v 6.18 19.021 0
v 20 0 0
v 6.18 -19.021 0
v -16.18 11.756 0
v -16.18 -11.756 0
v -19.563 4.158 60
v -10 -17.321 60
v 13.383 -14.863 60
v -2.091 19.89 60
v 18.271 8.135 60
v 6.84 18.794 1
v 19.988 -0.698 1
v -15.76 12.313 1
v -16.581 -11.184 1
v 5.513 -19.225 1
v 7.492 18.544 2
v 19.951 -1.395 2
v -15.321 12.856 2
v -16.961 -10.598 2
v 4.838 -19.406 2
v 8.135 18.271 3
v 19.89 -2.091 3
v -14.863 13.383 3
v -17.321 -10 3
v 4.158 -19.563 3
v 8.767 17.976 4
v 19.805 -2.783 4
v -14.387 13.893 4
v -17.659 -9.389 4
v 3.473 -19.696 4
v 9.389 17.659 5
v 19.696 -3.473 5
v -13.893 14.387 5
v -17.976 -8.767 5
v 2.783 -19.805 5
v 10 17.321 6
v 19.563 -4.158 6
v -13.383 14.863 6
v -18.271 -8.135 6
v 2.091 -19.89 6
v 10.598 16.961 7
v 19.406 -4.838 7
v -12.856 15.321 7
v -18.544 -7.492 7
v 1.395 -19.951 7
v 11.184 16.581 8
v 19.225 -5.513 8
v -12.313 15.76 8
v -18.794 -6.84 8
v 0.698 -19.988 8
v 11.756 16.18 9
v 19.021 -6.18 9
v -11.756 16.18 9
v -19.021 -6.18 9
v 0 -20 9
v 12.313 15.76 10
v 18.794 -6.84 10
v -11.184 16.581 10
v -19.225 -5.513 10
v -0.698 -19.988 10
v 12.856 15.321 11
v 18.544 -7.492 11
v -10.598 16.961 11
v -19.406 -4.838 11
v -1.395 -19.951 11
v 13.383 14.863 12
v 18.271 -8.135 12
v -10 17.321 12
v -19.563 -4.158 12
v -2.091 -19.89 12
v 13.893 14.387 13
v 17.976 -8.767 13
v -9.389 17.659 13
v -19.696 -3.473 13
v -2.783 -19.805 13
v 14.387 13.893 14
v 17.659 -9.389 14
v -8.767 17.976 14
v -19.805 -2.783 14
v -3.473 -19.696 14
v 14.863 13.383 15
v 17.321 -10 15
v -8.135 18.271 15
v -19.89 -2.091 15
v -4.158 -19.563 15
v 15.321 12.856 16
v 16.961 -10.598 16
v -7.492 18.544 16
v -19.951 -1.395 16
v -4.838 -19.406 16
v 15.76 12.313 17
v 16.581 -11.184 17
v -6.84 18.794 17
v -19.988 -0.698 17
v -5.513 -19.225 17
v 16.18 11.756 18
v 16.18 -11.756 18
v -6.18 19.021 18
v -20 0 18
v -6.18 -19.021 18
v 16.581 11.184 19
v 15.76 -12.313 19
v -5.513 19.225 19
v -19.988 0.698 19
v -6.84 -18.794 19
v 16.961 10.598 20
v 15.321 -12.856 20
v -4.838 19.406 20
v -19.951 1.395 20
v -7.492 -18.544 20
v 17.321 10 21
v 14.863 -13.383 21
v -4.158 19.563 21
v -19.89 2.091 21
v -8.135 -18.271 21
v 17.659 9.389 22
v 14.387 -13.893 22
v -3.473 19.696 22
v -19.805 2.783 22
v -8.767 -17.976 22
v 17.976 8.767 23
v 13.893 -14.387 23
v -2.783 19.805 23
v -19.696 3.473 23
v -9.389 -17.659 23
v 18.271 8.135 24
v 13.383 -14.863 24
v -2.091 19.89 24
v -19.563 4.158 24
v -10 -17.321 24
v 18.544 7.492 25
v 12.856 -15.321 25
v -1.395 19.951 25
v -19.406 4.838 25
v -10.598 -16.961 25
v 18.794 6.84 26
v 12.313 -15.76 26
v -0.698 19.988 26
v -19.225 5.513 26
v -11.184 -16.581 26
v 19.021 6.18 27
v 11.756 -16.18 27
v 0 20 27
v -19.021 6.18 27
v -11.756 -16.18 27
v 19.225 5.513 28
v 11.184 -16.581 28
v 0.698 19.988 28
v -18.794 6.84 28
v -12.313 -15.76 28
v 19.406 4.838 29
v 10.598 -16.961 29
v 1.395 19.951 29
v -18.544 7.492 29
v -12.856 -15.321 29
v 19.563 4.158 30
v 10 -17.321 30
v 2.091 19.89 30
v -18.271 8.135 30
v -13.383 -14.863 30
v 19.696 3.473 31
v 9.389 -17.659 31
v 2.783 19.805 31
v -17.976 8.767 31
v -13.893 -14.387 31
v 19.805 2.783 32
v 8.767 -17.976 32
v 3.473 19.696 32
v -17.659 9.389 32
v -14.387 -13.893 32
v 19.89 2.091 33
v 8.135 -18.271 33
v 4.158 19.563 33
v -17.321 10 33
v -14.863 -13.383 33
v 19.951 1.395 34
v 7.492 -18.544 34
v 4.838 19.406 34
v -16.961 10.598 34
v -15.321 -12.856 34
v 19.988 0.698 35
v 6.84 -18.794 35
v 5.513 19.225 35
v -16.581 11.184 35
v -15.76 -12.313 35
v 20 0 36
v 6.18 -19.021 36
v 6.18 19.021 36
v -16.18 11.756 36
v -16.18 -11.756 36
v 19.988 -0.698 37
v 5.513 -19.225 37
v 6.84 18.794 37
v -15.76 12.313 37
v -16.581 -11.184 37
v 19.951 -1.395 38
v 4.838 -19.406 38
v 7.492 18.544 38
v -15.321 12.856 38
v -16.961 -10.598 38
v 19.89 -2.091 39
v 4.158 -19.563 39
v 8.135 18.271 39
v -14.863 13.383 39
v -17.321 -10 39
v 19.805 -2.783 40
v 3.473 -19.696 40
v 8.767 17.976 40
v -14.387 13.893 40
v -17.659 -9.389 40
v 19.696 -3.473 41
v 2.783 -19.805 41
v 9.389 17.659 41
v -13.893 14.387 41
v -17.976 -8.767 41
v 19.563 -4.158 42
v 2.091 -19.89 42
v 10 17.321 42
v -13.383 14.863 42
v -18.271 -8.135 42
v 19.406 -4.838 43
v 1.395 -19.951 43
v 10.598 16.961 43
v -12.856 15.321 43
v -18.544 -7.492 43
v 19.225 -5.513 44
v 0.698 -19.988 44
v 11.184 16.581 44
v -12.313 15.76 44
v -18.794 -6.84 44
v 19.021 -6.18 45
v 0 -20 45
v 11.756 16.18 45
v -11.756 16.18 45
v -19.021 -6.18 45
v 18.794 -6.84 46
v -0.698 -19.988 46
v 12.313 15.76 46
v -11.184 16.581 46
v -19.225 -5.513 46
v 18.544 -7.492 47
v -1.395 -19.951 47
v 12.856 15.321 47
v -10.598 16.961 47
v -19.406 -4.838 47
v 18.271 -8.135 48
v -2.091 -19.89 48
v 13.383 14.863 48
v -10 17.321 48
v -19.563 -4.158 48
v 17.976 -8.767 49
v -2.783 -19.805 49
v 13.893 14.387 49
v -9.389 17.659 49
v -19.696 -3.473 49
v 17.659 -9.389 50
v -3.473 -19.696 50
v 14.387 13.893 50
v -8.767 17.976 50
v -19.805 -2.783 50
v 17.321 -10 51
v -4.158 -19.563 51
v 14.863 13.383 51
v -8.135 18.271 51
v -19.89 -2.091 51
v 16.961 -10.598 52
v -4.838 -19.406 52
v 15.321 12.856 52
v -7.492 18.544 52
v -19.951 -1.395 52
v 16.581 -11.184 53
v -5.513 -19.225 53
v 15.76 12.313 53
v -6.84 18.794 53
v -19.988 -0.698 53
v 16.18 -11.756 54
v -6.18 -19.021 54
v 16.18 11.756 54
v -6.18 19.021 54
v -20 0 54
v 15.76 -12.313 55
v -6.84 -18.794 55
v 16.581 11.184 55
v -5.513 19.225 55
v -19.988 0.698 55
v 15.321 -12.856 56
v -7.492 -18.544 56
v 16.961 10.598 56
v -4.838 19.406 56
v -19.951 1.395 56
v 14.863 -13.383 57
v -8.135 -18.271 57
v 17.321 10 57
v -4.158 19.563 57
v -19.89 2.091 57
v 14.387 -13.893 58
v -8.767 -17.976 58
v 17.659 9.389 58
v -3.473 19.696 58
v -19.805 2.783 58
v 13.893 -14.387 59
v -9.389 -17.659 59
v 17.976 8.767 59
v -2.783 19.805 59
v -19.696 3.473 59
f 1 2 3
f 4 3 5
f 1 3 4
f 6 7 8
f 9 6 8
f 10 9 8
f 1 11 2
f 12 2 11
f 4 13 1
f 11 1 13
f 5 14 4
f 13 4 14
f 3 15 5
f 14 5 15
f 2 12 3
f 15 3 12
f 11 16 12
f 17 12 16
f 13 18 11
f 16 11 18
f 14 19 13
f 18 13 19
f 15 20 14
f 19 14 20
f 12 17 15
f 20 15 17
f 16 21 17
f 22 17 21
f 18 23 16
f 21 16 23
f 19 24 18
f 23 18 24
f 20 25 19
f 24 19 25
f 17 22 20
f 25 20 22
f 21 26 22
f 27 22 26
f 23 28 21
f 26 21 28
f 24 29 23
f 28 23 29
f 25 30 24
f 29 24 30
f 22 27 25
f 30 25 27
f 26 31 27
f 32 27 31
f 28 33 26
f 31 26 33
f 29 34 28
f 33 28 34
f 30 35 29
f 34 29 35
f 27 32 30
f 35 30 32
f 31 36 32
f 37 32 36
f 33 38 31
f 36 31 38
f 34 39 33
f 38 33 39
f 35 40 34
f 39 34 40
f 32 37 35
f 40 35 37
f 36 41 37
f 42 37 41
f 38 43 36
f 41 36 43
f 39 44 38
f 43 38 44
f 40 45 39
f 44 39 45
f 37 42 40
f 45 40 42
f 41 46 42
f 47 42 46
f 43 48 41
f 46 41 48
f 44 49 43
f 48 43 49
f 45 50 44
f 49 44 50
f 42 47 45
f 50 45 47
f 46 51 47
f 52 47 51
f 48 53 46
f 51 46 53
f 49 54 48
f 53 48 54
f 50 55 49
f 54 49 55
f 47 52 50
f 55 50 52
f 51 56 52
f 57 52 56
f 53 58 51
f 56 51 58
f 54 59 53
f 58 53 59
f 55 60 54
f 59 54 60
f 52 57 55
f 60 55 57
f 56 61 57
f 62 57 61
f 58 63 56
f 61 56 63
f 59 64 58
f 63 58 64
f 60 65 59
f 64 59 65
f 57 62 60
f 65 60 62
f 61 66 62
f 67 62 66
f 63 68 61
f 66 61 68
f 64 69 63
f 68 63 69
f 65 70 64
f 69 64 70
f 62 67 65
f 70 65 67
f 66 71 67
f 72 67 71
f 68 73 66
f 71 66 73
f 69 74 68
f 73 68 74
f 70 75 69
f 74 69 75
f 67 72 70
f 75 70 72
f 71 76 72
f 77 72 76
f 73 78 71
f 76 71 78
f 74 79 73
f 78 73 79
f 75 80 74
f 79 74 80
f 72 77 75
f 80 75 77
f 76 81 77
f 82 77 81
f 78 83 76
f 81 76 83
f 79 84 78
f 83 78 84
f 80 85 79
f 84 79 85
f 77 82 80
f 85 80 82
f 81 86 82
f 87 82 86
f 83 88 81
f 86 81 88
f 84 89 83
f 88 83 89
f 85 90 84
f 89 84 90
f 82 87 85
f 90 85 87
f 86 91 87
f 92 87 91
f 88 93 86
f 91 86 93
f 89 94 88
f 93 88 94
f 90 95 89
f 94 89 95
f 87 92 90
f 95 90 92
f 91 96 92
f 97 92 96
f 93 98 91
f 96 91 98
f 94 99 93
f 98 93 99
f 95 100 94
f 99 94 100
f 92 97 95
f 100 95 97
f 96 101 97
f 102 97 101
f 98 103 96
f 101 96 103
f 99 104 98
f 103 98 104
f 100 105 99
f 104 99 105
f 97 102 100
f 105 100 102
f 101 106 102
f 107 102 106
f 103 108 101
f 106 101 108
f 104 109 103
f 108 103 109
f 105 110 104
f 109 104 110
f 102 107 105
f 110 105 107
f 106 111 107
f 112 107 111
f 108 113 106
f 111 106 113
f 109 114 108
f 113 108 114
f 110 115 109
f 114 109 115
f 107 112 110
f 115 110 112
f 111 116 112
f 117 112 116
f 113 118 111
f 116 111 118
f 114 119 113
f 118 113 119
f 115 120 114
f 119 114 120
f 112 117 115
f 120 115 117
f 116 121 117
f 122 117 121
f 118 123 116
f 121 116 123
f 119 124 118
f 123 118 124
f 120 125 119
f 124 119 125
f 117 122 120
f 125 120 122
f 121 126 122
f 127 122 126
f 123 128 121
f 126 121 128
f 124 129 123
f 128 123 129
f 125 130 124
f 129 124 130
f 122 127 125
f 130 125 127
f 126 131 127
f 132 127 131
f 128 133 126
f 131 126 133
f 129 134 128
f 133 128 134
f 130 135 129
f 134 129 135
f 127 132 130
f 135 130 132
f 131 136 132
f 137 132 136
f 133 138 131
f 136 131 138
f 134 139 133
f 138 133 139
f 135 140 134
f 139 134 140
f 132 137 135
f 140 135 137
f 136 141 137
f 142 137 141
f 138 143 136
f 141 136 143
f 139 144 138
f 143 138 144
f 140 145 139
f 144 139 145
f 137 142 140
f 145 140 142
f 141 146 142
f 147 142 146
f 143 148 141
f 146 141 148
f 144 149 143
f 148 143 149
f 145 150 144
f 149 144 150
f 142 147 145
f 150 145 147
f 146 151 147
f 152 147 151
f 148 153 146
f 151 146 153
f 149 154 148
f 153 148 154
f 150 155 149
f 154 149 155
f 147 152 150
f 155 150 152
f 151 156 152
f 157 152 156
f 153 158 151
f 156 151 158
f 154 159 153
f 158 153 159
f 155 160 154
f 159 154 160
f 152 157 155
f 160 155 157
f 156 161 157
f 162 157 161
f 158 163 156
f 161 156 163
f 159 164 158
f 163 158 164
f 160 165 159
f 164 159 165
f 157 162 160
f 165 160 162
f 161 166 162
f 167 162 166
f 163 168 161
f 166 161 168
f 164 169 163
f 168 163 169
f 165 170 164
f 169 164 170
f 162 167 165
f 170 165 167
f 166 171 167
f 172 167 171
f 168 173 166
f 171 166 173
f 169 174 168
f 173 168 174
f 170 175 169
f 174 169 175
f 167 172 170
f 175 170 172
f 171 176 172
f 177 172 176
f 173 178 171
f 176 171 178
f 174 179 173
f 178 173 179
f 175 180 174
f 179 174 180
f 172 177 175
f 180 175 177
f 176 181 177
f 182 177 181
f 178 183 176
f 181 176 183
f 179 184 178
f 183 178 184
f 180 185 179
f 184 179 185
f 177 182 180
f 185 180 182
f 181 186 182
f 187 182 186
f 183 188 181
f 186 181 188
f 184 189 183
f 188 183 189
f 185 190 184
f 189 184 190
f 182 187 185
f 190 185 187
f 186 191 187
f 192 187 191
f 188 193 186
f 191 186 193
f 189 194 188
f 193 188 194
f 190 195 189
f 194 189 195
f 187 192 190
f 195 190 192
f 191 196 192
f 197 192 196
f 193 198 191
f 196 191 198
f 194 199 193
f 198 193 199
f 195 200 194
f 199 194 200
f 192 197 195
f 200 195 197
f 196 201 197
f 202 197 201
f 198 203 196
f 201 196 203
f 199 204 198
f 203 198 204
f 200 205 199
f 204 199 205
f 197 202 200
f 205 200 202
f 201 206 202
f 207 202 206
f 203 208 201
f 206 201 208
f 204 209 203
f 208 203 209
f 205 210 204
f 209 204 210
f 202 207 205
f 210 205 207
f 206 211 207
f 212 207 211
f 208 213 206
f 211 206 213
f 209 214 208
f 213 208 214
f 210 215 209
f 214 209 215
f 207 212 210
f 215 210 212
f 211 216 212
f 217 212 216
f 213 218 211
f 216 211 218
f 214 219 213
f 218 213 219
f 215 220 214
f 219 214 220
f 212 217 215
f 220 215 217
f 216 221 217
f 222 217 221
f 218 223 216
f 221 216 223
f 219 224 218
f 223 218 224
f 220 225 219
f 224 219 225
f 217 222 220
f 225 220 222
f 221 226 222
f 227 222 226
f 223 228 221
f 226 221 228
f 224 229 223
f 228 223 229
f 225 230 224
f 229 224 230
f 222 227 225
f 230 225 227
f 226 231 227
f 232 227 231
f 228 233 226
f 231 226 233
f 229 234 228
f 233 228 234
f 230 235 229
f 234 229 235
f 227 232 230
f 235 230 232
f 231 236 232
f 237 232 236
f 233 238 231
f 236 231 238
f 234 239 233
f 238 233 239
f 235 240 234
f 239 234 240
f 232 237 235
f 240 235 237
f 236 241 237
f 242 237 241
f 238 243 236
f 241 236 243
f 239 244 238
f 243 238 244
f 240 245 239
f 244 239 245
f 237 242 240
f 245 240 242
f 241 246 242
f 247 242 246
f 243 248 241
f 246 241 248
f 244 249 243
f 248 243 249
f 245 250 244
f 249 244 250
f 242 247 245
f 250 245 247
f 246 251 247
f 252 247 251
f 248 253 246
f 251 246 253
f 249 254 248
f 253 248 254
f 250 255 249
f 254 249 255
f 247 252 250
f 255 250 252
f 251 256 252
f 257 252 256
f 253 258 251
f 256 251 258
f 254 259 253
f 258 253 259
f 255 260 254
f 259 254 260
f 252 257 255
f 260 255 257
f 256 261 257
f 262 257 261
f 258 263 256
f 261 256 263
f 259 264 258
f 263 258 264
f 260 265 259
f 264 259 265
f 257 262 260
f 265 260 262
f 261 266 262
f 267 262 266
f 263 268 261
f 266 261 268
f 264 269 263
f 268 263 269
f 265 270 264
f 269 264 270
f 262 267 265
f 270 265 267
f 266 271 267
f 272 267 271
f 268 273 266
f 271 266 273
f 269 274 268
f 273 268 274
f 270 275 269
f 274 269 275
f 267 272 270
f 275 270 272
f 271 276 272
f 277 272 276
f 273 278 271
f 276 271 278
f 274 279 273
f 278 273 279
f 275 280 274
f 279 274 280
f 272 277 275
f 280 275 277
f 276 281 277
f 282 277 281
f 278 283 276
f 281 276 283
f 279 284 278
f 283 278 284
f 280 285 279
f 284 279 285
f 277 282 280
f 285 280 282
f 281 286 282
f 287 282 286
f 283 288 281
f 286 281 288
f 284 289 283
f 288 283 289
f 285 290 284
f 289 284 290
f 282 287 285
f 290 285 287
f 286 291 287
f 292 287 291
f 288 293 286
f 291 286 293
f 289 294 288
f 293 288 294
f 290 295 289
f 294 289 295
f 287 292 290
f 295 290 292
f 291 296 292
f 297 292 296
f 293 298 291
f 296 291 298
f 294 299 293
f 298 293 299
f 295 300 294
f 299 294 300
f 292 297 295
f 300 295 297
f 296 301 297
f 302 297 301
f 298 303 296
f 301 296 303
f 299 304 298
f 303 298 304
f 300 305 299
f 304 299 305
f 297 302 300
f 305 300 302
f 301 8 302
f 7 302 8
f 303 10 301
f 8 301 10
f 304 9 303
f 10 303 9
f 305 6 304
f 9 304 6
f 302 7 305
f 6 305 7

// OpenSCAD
linear_extrude(height=60, twist=120, slices=60)
    circle(r=20, $fn=5);
